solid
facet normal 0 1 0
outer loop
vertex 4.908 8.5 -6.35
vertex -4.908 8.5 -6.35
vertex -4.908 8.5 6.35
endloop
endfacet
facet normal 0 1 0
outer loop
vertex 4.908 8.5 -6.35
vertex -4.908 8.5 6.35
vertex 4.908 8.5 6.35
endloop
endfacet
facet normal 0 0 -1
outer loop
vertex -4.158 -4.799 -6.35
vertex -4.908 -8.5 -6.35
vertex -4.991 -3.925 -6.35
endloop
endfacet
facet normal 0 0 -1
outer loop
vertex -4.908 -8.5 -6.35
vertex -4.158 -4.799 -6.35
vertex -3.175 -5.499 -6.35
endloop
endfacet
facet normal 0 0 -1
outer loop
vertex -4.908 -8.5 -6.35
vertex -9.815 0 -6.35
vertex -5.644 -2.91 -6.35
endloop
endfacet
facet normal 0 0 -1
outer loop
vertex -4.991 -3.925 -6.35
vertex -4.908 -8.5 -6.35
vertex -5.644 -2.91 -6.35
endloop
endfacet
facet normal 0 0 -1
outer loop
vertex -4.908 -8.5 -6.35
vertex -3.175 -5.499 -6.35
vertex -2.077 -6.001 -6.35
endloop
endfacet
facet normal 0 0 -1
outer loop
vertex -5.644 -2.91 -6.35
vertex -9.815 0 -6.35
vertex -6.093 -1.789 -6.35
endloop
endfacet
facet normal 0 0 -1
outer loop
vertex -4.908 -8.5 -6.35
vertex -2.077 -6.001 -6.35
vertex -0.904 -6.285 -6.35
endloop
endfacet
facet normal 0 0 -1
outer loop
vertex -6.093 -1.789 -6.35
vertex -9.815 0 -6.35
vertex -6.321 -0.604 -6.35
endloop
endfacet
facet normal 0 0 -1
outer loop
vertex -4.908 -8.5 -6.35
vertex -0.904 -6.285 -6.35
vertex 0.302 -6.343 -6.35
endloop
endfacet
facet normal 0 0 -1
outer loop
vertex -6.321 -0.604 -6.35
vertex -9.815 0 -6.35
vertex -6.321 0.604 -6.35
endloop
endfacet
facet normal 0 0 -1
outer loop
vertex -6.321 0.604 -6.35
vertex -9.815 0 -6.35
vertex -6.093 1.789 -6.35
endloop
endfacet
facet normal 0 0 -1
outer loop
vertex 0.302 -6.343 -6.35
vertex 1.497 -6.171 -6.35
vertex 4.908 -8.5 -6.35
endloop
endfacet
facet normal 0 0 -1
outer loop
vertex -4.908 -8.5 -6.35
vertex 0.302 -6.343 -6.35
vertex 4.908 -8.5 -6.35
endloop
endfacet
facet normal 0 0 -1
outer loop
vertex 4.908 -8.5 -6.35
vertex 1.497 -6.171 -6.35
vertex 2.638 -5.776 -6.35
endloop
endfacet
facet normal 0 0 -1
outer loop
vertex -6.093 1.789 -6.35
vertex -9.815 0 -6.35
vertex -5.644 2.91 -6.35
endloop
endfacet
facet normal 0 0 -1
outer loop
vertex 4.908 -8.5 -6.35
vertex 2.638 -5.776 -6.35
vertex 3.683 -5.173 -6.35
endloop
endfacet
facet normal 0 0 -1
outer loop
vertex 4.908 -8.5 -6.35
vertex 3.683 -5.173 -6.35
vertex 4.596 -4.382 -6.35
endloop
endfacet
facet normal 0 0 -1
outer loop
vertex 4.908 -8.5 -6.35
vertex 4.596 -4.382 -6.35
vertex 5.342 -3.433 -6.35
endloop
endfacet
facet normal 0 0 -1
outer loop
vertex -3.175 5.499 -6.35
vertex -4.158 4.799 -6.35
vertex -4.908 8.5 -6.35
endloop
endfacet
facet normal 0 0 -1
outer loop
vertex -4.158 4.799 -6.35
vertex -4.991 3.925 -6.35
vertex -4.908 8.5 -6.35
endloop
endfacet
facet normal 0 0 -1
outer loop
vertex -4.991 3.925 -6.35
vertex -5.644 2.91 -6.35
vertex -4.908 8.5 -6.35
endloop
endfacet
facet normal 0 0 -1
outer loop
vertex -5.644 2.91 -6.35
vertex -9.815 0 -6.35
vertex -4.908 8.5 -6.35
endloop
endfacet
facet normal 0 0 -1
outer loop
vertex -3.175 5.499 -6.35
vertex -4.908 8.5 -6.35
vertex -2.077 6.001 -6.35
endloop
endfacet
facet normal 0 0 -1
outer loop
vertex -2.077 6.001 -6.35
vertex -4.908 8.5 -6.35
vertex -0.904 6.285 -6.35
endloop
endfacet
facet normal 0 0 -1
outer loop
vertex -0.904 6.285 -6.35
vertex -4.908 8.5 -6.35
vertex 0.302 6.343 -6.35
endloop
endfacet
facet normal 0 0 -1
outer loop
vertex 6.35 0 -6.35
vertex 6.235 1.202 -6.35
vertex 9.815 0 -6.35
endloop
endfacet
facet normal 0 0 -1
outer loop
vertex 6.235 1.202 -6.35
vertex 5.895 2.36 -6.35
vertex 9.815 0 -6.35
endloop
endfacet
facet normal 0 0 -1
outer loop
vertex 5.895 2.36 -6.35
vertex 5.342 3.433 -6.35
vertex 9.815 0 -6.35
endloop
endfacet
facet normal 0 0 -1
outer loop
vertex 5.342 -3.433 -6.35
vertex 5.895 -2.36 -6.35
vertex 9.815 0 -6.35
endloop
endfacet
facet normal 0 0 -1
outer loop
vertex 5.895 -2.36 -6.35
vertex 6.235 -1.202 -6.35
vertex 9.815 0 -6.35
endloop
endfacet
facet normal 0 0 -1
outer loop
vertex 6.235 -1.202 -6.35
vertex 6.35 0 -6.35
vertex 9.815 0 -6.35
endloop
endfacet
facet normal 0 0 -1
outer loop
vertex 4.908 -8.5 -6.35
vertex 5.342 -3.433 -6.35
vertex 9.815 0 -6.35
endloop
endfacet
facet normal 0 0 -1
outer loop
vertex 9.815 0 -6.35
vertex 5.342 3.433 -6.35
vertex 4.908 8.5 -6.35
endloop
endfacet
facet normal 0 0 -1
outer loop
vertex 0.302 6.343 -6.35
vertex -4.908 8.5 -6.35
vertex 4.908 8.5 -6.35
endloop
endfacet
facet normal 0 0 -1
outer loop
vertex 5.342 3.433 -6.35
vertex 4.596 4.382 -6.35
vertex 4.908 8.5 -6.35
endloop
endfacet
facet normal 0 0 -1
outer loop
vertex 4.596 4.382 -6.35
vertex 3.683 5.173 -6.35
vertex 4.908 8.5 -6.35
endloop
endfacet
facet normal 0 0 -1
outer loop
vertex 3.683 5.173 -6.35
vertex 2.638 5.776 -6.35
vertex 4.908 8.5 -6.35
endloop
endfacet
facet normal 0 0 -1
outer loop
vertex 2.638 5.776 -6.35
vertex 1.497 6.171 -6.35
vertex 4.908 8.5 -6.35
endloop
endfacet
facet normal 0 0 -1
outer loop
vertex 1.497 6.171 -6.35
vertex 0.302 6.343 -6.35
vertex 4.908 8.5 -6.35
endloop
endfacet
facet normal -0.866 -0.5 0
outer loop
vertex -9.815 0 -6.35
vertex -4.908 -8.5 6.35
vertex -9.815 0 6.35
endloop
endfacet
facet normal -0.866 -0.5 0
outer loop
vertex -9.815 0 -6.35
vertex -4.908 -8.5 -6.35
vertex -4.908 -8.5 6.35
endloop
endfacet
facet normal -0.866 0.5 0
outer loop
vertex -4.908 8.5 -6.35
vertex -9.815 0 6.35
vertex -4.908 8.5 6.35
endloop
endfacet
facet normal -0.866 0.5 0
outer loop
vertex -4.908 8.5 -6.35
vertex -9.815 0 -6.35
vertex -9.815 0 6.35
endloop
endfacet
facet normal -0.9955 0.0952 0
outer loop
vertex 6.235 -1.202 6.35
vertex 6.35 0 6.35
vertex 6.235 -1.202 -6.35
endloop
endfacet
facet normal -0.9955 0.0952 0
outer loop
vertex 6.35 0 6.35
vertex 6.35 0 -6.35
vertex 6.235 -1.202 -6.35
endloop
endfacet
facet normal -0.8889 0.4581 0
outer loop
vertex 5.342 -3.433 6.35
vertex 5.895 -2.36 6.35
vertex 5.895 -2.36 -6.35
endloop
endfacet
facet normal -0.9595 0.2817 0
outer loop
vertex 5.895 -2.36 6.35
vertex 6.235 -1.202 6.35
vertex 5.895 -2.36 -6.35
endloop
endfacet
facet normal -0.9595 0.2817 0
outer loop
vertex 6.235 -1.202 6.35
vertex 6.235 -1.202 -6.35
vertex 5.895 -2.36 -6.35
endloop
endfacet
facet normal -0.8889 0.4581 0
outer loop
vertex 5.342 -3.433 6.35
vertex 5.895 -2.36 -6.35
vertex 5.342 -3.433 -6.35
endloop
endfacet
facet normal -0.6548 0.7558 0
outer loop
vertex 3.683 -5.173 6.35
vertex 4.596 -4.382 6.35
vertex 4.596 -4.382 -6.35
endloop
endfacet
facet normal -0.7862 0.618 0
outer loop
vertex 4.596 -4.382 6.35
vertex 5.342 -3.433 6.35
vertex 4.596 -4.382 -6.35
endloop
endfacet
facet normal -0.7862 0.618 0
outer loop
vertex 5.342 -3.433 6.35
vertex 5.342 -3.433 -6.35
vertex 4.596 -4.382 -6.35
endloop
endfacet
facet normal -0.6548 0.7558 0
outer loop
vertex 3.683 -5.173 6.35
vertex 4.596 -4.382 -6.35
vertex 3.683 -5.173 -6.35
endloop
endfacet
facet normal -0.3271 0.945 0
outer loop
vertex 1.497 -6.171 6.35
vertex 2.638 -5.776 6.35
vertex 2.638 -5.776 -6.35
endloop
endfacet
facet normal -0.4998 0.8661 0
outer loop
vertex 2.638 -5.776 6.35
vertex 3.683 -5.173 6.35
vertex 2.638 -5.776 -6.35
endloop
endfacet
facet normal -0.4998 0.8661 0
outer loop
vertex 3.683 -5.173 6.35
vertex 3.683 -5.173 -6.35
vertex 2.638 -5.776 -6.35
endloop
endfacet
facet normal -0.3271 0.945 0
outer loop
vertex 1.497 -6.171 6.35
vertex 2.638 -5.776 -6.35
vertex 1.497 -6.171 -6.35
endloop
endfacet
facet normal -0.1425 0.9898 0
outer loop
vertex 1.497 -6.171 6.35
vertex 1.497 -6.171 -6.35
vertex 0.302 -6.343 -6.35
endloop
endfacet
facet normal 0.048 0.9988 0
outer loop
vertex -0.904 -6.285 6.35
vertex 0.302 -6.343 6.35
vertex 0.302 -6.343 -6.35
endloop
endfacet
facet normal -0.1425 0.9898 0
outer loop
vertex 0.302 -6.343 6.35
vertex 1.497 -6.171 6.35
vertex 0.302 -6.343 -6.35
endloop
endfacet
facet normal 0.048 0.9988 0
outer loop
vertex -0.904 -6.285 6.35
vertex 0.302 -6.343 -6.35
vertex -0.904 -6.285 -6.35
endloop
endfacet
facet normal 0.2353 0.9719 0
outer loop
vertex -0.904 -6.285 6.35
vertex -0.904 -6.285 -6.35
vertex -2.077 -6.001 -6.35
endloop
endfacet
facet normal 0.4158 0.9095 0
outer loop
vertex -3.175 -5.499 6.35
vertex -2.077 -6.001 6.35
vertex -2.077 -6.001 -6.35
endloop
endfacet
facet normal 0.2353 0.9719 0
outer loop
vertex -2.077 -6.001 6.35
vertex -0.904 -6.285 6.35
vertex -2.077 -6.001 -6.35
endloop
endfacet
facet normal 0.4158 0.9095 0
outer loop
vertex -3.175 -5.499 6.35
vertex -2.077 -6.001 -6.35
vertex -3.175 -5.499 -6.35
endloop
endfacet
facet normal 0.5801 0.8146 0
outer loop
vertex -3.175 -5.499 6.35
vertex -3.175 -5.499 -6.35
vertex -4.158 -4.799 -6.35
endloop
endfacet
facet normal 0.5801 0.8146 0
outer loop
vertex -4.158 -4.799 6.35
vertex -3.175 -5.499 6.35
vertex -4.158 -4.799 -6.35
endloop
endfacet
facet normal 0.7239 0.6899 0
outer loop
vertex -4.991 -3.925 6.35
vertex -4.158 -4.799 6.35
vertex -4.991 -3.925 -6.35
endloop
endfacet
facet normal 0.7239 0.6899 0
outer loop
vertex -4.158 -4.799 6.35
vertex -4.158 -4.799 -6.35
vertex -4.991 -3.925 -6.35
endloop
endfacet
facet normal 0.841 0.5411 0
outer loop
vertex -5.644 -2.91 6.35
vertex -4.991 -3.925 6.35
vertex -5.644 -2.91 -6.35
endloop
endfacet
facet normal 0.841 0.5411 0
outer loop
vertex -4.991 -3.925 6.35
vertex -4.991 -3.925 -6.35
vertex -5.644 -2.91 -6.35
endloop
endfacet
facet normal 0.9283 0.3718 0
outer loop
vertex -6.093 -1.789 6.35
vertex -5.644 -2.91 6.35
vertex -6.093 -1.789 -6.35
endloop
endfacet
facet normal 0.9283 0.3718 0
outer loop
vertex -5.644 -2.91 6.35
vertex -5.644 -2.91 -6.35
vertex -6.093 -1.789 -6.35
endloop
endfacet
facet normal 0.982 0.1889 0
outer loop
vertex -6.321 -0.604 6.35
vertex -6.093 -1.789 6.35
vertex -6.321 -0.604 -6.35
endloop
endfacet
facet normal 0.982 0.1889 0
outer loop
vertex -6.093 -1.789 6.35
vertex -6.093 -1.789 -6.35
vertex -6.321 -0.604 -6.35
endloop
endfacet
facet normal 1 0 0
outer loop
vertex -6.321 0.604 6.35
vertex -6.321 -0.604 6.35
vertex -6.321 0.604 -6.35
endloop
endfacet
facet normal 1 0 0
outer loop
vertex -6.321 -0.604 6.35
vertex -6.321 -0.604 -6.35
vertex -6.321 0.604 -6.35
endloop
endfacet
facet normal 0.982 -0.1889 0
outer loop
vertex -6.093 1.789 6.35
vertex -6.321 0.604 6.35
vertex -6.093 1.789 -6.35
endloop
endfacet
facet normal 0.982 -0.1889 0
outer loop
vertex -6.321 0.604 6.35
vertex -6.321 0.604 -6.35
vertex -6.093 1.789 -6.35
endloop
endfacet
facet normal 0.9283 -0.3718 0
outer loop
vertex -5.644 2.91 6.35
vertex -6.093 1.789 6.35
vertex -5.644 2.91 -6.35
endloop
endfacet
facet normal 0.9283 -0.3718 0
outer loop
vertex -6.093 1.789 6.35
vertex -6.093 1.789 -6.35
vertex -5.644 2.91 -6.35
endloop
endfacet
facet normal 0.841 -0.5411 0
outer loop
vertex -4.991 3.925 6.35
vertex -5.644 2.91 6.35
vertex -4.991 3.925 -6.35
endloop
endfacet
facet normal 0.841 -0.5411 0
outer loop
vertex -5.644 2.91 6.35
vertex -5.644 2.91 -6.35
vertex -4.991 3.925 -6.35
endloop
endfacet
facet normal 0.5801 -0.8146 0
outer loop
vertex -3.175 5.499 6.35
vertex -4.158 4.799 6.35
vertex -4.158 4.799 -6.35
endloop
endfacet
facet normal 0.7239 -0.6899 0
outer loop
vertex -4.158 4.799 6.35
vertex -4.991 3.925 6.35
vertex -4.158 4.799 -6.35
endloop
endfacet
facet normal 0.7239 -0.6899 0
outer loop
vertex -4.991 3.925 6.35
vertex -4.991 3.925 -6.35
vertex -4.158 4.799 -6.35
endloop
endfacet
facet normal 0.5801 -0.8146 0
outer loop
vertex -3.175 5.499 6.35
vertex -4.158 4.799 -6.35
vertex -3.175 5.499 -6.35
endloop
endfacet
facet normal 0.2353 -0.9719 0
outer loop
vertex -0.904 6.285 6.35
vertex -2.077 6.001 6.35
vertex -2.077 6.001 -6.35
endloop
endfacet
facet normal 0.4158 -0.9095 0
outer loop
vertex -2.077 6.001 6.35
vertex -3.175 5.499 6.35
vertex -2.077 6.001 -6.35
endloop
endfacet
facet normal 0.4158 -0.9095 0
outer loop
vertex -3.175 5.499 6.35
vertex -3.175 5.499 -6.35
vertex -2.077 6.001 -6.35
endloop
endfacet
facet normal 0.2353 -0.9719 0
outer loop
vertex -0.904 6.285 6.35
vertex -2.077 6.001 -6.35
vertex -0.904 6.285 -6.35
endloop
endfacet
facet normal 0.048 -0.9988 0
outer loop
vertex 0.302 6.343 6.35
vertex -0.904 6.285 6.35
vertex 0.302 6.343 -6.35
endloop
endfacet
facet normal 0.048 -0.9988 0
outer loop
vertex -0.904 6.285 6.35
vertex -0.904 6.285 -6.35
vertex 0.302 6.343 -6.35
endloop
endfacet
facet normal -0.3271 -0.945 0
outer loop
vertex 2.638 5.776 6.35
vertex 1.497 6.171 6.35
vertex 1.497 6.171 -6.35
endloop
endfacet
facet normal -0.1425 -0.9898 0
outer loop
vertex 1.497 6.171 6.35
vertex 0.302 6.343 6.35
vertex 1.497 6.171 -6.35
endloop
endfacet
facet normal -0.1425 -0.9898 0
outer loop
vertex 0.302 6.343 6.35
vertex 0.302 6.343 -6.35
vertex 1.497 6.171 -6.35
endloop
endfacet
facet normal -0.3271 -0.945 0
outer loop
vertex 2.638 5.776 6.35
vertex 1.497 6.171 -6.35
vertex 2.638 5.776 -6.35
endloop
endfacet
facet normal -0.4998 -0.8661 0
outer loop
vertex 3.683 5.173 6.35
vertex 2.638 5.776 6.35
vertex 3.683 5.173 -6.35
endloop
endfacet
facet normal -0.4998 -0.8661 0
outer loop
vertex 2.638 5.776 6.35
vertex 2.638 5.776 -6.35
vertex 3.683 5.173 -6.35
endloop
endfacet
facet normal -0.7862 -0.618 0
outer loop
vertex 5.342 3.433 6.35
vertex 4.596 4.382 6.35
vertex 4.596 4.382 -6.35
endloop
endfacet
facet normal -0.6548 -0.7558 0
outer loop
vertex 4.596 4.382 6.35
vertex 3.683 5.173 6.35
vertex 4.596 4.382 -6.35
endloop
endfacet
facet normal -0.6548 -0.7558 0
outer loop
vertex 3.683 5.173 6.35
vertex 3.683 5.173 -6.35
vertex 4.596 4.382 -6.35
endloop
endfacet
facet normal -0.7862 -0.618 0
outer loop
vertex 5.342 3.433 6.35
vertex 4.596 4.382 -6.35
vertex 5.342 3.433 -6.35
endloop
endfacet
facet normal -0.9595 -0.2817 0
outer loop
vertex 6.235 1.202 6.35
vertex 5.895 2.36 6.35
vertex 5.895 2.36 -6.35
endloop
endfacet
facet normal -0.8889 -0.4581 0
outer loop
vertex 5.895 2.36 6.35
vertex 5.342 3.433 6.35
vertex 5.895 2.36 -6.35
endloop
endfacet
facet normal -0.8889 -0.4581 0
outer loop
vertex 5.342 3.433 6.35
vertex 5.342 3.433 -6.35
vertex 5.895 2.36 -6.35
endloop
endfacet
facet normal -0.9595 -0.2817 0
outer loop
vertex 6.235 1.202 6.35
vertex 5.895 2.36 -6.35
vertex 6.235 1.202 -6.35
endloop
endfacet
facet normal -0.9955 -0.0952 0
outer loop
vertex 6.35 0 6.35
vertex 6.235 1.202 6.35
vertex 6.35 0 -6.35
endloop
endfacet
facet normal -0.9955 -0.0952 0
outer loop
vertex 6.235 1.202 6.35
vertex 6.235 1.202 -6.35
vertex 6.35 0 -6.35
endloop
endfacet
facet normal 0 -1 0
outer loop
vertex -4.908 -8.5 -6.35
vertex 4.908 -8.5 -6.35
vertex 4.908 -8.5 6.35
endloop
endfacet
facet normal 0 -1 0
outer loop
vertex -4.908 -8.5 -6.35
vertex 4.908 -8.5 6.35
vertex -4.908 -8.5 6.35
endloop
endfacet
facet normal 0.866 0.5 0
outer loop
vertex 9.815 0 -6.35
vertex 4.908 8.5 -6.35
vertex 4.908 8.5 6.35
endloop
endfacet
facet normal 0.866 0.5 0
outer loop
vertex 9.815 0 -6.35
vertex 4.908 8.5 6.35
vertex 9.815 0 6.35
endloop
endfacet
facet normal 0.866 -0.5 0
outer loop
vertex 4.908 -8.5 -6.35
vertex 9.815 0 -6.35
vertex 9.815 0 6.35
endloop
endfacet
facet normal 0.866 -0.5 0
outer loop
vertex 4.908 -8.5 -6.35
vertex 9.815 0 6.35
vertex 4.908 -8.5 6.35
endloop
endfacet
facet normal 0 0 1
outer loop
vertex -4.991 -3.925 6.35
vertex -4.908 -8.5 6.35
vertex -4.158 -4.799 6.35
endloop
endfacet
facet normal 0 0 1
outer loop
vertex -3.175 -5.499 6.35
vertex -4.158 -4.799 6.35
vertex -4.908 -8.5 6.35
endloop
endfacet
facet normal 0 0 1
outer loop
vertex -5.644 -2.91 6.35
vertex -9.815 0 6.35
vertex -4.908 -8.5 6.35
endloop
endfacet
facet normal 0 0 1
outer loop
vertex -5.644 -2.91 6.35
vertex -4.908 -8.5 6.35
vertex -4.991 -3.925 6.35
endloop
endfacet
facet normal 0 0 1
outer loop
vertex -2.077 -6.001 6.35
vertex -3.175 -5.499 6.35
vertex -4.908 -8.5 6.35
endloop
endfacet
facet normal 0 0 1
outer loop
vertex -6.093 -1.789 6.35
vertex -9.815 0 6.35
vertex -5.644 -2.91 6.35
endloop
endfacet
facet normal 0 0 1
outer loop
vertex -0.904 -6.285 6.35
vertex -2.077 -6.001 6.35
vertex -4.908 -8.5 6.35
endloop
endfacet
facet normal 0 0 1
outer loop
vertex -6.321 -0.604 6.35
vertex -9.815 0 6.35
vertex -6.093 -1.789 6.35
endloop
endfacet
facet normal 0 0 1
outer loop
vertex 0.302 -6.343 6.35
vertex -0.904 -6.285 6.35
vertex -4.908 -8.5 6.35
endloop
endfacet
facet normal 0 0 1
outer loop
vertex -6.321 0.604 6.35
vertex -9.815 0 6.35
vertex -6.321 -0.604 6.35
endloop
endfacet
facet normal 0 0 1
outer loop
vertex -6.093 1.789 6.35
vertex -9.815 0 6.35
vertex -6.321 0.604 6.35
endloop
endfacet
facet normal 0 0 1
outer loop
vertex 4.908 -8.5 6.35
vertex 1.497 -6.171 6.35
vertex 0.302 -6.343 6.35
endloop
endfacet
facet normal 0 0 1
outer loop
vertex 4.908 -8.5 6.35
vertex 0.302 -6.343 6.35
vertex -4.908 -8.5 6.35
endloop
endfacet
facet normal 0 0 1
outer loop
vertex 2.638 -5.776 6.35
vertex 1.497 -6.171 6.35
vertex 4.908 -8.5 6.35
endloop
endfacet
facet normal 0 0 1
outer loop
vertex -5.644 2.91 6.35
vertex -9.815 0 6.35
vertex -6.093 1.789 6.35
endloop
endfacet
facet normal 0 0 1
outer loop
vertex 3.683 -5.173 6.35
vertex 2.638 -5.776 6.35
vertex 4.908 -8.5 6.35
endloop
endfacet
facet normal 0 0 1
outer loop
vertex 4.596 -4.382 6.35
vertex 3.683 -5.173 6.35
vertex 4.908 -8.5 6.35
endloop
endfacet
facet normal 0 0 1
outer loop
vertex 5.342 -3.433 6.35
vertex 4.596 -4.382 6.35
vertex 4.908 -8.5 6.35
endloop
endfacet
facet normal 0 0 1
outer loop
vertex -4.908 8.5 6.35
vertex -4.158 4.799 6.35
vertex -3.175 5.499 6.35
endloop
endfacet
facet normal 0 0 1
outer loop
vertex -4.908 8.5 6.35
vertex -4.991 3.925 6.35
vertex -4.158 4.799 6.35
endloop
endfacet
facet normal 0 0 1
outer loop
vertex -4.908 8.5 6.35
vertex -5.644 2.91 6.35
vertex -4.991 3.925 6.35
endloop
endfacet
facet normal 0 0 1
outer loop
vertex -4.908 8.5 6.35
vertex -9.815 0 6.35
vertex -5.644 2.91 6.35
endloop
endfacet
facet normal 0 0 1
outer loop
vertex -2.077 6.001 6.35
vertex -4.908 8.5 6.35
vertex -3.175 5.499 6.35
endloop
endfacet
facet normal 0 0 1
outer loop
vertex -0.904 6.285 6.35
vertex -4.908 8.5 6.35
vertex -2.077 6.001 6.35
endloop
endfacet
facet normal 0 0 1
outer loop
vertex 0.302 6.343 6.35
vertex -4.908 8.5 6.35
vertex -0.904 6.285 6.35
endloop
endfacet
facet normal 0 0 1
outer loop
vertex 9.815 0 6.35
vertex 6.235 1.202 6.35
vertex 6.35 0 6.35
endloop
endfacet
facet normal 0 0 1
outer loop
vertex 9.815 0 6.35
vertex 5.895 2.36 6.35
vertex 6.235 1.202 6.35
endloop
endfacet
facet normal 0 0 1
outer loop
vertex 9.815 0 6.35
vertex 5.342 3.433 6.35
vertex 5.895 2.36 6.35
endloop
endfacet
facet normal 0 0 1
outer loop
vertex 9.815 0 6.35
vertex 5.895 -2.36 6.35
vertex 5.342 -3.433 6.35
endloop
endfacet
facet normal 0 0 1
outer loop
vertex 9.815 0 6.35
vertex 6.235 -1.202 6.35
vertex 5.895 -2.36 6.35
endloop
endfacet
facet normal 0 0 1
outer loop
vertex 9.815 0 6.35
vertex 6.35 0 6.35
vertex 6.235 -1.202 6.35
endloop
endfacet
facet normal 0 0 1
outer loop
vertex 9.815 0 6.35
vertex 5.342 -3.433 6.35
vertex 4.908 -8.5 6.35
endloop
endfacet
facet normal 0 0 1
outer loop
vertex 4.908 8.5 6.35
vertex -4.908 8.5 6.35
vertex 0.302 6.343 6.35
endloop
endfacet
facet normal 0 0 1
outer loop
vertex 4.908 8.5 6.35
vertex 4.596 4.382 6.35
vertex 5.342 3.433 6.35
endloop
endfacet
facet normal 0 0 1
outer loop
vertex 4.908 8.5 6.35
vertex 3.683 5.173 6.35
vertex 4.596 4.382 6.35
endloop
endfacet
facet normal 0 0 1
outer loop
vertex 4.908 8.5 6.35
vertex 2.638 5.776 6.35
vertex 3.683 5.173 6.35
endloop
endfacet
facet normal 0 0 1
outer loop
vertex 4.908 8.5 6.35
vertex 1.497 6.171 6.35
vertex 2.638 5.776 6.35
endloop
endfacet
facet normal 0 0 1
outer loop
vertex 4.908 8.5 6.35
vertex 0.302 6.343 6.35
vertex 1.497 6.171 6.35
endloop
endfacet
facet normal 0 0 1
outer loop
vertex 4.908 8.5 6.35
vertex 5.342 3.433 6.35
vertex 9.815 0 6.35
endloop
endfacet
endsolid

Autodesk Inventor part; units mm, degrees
ref_plane "YZ Plane" through (0, 0, 0) normal (1, 0, 0) x (0, 1, 0)
ref_plane "XZ Plane" through (0, 0, 0) normal (0, 1, 0) x (-1, 0, 0)
ref_plane "XY Plane" through (0, 0, 0) normal (0, 0, 1) x (1, 0, 0)
sketch "Sketch1" plane through (0, 0, 0) normal (0, 0, 1) x (1, 0, 0)
  line L0 (4.9075, 8.5) -> (9.815, 0)
  line L1 (9.815, 0) -> (4.9075, -8.5)
  line L2 (4.9075, -8.5) -> (-4.9075, -8.5)
  line L3 (-4.9075, -8.5) -> (-9.815, 0)
  line L4 (-9.815, 0) -> (-4.9075, 8.5)
  line L5 (-4.9075, 8.5) -> (4.9075, 8.5)
  circle A0 centre (0, 0) radius 6.35
  dimension "d0" = 17
  dimension "d1" = 12.7
extrude "Extrusion1" add sketch "Sketch1" along normal mid plane 12.7
equation "\"d0\" = hexOutput"
equation "\"d1\" = shaftSize"
equation "\"d2\" = length"
equation "\"hexOutput\" = 17"
equation "\"shaftSize\" = 12.7"
equation "\"length\" = 12.7"
properties part number "17mmTo0.5inchBearing"
